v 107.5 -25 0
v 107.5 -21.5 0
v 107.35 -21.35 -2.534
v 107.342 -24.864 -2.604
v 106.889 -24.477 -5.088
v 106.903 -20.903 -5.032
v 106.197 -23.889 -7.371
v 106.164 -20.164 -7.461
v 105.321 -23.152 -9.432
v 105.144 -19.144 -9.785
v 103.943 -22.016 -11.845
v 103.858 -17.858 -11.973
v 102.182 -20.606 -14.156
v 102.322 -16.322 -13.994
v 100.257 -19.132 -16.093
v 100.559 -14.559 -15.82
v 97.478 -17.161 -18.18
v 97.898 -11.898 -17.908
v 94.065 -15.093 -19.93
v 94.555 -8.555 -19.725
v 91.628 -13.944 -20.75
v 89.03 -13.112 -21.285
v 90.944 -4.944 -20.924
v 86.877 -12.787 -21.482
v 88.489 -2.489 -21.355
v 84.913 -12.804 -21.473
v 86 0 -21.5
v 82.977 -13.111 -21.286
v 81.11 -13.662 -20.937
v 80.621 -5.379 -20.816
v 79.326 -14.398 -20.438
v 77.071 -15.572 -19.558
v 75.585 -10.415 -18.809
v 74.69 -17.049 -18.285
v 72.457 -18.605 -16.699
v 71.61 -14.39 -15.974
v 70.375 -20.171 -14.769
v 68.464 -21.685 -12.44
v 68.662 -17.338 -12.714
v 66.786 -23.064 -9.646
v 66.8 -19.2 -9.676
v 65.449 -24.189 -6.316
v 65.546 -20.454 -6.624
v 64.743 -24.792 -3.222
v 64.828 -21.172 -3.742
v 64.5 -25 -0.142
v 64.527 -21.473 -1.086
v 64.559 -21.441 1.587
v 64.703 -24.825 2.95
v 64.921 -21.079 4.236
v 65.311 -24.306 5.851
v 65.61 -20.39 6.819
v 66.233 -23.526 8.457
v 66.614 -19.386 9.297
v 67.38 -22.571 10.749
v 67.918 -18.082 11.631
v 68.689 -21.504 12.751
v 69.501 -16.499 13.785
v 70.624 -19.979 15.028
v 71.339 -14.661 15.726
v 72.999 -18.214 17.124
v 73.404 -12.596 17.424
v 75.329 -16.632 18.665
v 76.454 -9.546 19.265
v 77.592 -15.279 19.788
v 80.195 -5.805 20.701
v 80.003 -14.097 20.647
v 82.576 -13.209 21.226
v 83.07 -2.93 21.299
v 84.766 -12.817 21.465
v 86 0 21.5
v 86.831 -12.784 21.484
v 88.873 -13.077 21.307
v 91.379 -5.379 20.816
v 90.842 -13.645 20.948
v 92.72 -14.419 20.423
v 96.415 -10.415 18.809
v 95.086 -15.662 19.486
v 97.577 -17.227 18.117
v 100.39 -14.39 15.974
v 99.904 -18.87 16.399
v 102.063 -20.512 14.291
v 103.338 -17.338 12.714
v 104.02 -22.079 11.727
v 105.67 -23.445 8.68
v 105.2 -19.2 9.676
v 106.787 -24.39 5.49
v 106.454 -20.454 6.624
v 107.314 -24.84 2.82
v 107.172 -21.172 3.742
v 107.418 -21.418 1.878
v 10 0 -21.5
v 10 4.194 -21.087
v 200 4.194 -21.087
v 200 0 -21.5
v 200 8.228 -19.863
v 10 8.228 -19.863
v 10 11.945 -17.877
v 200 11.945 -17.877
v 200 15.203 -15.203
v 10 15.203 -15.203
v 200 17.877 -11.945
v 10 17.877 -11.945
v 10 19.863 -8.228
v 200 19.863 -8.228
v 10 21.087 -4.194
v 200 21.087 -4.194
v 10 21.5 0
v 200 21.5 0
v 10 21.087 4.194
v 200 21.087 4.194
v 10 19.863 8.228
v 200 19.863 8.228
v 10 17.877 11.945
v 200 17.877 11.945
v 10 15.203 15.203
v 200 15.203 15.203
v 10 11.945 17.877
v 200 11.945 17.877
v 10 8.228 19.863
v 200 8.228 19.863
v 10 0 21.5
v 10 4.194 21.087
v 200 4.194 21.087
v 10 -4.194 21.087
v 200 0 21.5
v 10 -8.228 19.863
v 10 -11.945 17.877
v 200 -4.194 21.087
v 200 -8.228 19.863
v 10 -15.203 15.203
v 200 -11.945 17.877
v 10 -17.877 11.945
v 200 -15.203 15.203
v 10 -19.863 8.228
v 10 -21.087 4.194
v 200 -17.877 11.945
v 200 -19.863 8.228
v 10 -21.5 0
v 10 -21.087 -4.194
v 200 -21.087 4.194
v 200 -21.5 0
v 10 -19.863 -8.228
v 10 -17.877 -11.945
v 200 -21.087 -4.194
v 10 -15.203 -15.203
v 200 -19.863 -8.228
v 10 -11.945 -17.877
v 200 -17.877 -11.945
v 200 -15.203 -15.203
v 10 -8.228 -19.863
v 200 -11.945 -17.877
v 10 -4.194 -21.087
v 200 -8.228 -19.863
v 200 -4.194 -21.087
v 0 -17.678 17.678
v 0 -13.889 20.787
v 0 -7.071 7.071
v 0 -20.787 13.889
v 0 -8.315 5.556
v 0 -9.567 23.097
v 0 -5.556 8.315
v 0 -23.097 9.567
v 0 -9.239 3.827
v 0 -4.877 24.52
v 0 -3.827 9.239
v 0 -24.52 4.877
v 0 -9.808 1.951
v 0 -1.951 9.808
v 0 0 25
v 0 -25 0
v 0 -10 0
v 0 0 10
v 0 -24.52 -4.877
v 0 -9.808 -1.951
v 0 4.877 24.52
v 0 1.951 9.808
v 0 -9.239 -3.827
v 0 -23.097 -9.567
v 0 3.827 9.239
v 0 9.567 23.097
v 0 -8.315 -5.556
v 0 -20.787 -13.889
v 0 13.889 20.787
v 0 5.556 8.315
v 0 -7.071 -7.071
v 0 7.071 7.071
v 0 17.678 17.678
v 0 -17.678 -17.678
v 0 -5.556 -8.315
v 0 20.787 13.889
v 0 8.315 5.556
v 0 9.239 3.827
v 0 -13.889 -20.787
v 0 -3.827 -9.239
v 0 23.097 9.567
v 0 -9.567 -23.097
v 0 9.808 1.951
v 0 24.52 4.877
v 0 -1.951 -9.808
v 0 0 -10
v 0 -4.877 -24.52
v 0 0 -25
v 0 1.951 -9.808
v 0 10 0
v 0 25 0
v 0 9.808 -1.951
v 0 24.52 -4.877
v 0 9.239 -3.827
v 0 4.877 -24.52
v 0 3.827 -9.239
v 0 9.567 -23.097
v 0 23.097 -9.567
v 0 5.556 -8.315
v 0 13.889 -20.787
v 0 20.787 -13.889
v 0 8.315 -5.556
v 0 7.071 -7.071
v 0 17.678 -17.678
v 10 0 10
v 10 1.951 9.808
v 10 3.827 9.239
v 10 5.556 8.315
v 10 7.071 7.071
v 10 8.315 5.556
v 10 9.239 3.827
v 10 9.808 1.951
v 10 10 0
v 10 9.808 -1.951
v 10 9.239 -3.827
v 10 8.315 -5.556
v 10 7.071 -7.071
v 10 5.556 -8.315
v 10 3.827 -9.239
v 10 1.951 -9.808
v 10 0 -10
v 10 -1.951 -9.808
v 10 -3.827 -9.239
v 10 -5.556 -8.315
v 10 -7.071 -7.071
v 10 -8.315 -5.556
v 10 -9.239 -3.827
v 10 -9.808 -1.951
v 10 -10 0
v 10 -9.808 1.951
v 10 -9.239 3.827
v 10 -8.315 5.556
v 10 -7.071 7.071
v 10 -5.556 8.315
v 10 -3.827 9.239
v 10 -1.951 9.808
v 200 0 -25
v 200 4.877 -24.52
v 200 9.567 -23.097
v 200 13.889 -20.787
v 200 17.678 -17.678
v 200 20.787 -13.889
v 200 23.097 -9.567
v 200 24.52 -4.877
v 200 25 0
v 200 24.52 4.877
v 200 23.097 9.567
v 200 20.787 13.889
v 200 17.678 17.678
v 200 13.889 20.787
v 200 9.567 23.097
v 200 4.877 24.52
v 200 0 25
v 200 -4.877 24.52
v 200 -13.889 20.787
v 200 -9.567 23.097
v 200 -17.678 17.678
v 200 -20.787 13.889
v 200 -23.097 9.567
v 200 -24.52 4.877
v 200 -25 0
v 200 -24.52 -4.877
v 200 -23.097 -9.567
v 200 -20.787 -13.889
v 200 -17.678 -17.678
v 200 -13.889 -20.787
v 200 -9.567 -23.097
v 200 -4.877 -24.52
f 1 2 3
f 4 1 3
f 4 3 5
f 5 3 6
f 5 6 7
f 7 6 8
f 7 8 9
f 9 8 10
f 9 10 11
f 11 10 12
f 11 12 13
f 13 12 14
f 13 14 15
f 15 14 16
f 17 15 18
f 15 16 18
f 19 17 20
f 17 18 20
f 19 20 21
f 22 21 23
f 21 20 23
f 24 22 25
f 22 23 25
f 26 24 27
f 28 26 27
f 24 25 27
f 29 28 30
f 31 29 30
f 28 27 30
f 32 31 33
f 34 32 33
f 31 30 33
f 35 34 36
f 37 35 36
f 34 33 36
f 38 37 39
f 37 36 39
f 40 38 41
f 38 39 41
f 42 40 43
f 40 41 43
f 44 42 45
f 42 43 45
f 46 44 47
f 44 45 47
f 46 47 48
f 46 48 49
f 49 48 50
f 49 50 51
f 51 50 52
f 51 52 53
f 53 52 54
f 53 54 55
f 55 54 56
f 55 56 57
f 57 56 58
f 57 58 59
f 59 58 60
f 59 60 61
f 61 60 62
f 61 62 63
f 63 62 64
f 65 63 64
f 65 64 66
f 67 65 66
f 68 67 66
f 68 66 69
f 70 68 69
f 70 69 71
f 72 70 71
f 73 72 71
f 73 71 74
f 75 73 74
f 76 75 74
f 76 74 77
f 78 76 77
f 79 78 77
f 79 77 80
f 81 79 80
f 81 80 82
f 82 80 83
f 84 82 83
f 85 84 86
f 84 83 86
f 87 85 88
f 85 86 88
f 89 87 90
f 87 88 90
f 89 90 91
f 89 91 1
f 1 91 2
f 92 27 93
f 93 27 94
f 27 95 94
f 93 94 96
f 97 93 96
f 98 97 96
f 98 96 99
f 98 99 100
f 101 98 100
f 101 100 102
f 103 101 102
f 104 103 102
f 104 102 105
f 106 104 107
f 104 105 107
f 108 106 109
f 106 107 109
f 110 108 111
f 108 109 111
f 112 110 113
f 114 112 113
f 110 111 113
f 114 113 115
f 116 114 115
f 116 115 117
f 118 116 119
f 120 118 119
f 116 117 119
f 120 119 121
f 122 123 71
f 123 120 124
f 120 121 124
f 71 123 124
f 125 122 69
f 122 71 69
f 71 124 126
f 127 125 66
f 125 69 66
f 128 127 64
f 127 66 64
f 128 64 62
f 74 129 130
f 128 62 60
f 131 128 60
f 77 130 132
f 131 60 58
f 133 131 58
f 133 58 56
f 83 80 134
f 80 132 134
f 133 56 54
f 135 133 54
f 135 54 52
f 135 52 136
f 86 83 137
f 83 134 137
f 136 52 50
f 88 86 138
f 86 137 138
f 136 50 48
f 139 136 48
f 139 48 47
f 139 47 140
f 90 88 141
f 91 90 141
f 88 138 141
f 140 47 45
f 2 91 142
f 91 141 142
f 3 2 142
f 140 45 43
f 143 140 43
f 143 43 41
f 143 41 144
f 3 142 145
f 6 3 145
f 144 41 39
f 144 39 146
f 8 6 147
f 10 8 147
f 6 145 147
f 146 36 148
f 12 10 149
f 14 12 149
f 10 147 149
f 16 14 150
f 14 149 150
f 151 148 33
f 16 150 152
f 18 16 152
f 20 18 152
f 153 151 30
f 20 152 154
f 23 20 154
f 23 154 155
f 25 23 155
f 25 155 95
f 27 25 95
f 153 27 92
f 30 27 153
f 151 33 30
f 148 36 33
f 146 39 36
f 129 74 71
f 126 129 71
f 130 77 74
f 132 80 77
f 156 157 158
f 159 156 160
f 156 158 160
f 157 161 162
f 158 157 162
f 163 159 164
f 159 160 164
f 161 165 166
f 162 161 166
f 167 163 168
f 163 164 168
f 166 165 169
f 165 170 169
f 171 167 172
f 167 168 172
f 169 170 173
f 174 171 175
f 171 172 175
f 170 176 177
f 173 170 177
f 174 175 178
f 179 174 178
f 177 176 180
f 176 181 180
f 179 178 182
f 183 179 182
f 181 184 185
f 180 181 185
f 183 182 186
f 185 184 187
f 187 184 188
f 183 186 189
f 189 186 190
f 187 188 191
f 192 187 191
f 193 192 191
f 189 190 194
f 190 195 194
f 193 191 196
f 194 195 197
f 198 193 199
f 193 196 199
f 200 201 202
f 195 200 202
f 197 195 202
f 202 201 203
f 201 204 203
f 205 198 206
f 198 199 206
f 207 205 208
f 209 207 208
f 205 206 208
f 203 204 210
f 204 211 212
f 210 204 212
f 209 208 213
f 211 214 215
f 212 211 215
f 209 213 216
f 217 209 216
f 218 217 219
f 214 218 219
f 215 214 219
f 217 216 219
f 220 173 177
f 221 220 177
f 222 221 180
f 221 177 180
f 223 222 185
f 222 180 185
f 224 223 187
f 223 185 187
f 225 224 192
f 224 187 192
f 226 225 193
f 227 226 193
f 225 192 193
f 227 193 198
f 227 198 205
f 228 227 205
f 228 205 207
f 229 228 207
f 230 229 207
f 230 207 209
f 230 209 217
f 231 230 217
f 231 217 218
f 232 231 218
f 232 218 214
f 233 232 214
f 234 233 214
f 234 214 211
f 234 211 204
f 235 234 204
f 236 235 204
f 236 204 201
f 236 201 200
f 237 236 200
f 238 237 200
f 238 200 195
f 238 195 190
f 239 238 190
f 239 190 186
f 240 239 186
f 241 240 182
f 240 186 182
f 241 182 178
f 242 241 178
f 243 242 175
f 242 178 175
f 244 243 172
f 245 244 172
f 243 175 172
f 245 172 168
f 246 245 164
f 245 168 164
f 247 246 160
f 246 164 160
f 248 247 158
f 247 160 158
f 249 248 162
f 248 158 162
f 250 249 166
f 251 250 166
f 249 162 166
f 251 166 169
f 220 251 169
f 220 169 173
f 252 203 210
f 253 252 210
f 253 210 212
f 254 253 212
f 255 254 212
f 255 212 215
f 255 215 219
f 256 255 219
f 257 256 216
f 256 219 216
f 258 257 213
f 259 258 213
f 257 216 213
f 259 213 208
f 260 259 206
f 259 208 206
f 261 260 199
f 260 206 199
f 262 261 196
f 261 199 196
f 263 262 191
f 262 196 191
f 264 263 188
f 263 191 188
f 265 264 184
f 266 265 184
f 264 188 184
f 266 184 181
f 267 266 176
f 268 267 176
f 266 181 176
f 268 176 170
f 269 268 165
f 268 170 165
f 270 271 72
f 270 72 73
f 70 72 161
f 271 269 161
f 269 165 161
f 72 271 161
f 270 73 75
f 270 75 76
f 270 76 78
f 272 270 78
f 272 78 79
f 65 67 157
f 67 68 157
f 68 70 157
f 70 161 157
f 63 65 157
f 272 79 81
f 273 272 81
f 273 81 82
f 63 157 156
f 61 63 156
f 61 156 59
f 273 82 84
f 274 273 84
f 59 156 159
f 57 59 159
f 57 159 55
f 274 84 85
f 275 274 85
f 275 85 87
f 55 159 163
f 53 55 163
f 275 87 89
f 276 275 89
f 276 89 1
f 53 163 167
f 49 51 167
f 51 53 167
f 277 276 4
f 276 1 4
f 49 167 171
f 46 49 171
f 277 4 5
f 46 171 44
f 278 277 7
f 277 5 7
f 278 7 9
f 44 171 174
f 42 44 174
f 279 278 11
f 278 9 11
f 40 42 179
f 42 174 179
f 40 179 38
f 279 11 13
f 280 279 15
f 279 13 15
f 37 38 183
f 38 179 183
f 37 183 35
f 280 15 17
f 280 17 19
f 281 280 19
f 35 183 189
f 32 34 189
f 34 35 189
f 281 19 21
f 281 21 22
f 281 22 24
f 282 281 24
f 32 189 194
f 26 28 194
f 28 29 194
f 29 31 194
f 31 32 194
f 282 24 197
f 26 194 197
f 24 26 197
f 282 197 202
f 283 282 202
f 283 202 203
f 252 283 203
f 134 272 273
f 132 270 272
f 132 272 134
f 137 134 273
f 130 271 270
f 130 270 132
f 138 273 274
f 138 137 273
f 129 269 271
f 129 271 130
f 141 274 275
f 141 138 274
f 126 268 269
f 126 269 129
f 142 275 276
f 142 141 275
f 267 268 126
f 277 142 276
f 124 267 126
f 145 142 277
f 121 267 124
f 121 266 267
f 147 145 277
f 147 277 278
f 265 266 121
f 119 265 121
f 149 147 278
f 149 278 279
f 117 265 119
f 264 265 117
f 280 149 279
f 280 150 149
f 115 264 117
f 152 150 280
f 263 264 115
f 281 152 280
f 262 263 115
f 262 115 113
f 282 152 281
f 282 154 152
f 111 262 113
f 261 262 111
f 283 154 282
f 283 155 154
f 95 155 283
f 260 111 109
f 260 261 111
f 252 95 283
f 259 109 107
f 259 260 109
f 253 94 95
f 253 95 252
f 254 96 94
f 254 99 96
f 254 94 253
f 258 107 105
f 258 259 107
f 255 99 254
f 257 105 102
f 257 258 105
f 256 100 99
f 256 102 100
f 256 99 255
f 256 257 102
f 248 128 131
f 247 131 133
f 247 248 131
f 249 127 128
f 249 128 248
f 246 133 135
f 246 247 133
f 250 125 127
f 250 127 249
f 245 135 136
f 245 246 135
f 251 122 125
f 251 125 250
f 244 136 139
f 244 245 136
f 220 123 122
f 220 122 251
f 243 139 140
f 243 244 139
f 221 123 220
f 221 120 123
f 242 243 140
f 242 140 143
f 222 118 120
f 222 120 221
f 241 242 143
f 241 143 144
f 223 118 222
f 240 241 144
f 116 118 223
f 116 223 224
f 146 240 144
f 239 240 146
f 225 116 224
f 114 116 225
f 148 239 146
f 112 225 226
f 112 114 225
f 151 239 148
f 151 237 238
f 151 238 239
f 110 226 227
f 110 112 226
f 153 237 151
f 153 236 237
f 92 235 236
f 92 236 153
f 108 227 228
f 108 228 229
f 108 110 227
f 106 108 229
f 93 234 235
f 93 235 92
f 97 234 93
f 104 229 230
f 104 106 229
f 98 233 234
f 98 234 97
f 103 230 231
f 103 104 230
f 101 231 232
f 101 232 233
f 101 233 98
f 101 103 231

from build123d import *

# Parameters (mm, degrees)
SKETCH1_R           = 25
BOSS_EXTRUDE3_DEPTH = 200
SKETCH3_R           = 21.5
CUT_EXTRUDE1_DEPTH  = 190
CUT_EXTRUDE2_REACH  = 202
SKETCH5_R           = 10
CUT_EXTRUDE3_REACH  = 27
SKETCH6_R           = 21.5


with BuildPart() as part:
    # Sketch1 → Boss-Extrude3 (new body)
    with BuildSketch(Plane(origin=(0, 0, 0), x_dir=(0, 0, -1), z_dir=(1, 0, 0))):
        Circle(SKETCH1_R)
    extrude(amount=BOSS_EXTRUDE3_DEPTH)

    # Sketch3 → Cut-Extrude1 (cut)
    with BuildSketch(Plane(origin=(200, 0, 0), x_dir=(0, 0, -1), z_dir=(1, 0, 0))):
        Circle(SKETCH3_R)
    extrude(amount=-CUT_EXTRUDE1_DEPTH, mode=Mode.SUBTRACT)

    # Sketch5 → Cut-Extrude2 (cut, up to next)
    with BuildSketch(Plane.ZY, mode=Mode.PRIVATE) as cut_extrude2_sk1:
        Circle(SKETCH5_R)
    cut_extrude2_tool1 = extrude(cut_extrude2_sk1.sketch, amount=-CUT_EXTRUDE2_REACH, mode=Mode.PRIVATE) & part.part
    add(cut_extrude2_tool1.solids().sort_by_distance((0, 0, 0))[0], mode=Mode.SUBTRACT)

    # Sketch6 → Cut-Extrude3 (cut, up to next)
    with BuildSketch(Plane(origin=(0, 0, 0), x_dir=(1, 0, 0), z_dir=(0, 1, 0)), mode=Mode.PRIVATE) as cut_extrude3_sk1:
        with Locations((86, 0)):
            Circle(SKETCH6_R)
    cut_extrude3_tool1 = extrude(cut_extrude3_sk1.sketch, amount=-CUT_EXTRUDE3_REACH, mode=Mode.PRIVATE) & part.part
    add(cut_extrude3_tool1.solids().sort_by_distance((86, 0, 0))[0], mode=Mode.SUBTRACT)


solid = part.part
